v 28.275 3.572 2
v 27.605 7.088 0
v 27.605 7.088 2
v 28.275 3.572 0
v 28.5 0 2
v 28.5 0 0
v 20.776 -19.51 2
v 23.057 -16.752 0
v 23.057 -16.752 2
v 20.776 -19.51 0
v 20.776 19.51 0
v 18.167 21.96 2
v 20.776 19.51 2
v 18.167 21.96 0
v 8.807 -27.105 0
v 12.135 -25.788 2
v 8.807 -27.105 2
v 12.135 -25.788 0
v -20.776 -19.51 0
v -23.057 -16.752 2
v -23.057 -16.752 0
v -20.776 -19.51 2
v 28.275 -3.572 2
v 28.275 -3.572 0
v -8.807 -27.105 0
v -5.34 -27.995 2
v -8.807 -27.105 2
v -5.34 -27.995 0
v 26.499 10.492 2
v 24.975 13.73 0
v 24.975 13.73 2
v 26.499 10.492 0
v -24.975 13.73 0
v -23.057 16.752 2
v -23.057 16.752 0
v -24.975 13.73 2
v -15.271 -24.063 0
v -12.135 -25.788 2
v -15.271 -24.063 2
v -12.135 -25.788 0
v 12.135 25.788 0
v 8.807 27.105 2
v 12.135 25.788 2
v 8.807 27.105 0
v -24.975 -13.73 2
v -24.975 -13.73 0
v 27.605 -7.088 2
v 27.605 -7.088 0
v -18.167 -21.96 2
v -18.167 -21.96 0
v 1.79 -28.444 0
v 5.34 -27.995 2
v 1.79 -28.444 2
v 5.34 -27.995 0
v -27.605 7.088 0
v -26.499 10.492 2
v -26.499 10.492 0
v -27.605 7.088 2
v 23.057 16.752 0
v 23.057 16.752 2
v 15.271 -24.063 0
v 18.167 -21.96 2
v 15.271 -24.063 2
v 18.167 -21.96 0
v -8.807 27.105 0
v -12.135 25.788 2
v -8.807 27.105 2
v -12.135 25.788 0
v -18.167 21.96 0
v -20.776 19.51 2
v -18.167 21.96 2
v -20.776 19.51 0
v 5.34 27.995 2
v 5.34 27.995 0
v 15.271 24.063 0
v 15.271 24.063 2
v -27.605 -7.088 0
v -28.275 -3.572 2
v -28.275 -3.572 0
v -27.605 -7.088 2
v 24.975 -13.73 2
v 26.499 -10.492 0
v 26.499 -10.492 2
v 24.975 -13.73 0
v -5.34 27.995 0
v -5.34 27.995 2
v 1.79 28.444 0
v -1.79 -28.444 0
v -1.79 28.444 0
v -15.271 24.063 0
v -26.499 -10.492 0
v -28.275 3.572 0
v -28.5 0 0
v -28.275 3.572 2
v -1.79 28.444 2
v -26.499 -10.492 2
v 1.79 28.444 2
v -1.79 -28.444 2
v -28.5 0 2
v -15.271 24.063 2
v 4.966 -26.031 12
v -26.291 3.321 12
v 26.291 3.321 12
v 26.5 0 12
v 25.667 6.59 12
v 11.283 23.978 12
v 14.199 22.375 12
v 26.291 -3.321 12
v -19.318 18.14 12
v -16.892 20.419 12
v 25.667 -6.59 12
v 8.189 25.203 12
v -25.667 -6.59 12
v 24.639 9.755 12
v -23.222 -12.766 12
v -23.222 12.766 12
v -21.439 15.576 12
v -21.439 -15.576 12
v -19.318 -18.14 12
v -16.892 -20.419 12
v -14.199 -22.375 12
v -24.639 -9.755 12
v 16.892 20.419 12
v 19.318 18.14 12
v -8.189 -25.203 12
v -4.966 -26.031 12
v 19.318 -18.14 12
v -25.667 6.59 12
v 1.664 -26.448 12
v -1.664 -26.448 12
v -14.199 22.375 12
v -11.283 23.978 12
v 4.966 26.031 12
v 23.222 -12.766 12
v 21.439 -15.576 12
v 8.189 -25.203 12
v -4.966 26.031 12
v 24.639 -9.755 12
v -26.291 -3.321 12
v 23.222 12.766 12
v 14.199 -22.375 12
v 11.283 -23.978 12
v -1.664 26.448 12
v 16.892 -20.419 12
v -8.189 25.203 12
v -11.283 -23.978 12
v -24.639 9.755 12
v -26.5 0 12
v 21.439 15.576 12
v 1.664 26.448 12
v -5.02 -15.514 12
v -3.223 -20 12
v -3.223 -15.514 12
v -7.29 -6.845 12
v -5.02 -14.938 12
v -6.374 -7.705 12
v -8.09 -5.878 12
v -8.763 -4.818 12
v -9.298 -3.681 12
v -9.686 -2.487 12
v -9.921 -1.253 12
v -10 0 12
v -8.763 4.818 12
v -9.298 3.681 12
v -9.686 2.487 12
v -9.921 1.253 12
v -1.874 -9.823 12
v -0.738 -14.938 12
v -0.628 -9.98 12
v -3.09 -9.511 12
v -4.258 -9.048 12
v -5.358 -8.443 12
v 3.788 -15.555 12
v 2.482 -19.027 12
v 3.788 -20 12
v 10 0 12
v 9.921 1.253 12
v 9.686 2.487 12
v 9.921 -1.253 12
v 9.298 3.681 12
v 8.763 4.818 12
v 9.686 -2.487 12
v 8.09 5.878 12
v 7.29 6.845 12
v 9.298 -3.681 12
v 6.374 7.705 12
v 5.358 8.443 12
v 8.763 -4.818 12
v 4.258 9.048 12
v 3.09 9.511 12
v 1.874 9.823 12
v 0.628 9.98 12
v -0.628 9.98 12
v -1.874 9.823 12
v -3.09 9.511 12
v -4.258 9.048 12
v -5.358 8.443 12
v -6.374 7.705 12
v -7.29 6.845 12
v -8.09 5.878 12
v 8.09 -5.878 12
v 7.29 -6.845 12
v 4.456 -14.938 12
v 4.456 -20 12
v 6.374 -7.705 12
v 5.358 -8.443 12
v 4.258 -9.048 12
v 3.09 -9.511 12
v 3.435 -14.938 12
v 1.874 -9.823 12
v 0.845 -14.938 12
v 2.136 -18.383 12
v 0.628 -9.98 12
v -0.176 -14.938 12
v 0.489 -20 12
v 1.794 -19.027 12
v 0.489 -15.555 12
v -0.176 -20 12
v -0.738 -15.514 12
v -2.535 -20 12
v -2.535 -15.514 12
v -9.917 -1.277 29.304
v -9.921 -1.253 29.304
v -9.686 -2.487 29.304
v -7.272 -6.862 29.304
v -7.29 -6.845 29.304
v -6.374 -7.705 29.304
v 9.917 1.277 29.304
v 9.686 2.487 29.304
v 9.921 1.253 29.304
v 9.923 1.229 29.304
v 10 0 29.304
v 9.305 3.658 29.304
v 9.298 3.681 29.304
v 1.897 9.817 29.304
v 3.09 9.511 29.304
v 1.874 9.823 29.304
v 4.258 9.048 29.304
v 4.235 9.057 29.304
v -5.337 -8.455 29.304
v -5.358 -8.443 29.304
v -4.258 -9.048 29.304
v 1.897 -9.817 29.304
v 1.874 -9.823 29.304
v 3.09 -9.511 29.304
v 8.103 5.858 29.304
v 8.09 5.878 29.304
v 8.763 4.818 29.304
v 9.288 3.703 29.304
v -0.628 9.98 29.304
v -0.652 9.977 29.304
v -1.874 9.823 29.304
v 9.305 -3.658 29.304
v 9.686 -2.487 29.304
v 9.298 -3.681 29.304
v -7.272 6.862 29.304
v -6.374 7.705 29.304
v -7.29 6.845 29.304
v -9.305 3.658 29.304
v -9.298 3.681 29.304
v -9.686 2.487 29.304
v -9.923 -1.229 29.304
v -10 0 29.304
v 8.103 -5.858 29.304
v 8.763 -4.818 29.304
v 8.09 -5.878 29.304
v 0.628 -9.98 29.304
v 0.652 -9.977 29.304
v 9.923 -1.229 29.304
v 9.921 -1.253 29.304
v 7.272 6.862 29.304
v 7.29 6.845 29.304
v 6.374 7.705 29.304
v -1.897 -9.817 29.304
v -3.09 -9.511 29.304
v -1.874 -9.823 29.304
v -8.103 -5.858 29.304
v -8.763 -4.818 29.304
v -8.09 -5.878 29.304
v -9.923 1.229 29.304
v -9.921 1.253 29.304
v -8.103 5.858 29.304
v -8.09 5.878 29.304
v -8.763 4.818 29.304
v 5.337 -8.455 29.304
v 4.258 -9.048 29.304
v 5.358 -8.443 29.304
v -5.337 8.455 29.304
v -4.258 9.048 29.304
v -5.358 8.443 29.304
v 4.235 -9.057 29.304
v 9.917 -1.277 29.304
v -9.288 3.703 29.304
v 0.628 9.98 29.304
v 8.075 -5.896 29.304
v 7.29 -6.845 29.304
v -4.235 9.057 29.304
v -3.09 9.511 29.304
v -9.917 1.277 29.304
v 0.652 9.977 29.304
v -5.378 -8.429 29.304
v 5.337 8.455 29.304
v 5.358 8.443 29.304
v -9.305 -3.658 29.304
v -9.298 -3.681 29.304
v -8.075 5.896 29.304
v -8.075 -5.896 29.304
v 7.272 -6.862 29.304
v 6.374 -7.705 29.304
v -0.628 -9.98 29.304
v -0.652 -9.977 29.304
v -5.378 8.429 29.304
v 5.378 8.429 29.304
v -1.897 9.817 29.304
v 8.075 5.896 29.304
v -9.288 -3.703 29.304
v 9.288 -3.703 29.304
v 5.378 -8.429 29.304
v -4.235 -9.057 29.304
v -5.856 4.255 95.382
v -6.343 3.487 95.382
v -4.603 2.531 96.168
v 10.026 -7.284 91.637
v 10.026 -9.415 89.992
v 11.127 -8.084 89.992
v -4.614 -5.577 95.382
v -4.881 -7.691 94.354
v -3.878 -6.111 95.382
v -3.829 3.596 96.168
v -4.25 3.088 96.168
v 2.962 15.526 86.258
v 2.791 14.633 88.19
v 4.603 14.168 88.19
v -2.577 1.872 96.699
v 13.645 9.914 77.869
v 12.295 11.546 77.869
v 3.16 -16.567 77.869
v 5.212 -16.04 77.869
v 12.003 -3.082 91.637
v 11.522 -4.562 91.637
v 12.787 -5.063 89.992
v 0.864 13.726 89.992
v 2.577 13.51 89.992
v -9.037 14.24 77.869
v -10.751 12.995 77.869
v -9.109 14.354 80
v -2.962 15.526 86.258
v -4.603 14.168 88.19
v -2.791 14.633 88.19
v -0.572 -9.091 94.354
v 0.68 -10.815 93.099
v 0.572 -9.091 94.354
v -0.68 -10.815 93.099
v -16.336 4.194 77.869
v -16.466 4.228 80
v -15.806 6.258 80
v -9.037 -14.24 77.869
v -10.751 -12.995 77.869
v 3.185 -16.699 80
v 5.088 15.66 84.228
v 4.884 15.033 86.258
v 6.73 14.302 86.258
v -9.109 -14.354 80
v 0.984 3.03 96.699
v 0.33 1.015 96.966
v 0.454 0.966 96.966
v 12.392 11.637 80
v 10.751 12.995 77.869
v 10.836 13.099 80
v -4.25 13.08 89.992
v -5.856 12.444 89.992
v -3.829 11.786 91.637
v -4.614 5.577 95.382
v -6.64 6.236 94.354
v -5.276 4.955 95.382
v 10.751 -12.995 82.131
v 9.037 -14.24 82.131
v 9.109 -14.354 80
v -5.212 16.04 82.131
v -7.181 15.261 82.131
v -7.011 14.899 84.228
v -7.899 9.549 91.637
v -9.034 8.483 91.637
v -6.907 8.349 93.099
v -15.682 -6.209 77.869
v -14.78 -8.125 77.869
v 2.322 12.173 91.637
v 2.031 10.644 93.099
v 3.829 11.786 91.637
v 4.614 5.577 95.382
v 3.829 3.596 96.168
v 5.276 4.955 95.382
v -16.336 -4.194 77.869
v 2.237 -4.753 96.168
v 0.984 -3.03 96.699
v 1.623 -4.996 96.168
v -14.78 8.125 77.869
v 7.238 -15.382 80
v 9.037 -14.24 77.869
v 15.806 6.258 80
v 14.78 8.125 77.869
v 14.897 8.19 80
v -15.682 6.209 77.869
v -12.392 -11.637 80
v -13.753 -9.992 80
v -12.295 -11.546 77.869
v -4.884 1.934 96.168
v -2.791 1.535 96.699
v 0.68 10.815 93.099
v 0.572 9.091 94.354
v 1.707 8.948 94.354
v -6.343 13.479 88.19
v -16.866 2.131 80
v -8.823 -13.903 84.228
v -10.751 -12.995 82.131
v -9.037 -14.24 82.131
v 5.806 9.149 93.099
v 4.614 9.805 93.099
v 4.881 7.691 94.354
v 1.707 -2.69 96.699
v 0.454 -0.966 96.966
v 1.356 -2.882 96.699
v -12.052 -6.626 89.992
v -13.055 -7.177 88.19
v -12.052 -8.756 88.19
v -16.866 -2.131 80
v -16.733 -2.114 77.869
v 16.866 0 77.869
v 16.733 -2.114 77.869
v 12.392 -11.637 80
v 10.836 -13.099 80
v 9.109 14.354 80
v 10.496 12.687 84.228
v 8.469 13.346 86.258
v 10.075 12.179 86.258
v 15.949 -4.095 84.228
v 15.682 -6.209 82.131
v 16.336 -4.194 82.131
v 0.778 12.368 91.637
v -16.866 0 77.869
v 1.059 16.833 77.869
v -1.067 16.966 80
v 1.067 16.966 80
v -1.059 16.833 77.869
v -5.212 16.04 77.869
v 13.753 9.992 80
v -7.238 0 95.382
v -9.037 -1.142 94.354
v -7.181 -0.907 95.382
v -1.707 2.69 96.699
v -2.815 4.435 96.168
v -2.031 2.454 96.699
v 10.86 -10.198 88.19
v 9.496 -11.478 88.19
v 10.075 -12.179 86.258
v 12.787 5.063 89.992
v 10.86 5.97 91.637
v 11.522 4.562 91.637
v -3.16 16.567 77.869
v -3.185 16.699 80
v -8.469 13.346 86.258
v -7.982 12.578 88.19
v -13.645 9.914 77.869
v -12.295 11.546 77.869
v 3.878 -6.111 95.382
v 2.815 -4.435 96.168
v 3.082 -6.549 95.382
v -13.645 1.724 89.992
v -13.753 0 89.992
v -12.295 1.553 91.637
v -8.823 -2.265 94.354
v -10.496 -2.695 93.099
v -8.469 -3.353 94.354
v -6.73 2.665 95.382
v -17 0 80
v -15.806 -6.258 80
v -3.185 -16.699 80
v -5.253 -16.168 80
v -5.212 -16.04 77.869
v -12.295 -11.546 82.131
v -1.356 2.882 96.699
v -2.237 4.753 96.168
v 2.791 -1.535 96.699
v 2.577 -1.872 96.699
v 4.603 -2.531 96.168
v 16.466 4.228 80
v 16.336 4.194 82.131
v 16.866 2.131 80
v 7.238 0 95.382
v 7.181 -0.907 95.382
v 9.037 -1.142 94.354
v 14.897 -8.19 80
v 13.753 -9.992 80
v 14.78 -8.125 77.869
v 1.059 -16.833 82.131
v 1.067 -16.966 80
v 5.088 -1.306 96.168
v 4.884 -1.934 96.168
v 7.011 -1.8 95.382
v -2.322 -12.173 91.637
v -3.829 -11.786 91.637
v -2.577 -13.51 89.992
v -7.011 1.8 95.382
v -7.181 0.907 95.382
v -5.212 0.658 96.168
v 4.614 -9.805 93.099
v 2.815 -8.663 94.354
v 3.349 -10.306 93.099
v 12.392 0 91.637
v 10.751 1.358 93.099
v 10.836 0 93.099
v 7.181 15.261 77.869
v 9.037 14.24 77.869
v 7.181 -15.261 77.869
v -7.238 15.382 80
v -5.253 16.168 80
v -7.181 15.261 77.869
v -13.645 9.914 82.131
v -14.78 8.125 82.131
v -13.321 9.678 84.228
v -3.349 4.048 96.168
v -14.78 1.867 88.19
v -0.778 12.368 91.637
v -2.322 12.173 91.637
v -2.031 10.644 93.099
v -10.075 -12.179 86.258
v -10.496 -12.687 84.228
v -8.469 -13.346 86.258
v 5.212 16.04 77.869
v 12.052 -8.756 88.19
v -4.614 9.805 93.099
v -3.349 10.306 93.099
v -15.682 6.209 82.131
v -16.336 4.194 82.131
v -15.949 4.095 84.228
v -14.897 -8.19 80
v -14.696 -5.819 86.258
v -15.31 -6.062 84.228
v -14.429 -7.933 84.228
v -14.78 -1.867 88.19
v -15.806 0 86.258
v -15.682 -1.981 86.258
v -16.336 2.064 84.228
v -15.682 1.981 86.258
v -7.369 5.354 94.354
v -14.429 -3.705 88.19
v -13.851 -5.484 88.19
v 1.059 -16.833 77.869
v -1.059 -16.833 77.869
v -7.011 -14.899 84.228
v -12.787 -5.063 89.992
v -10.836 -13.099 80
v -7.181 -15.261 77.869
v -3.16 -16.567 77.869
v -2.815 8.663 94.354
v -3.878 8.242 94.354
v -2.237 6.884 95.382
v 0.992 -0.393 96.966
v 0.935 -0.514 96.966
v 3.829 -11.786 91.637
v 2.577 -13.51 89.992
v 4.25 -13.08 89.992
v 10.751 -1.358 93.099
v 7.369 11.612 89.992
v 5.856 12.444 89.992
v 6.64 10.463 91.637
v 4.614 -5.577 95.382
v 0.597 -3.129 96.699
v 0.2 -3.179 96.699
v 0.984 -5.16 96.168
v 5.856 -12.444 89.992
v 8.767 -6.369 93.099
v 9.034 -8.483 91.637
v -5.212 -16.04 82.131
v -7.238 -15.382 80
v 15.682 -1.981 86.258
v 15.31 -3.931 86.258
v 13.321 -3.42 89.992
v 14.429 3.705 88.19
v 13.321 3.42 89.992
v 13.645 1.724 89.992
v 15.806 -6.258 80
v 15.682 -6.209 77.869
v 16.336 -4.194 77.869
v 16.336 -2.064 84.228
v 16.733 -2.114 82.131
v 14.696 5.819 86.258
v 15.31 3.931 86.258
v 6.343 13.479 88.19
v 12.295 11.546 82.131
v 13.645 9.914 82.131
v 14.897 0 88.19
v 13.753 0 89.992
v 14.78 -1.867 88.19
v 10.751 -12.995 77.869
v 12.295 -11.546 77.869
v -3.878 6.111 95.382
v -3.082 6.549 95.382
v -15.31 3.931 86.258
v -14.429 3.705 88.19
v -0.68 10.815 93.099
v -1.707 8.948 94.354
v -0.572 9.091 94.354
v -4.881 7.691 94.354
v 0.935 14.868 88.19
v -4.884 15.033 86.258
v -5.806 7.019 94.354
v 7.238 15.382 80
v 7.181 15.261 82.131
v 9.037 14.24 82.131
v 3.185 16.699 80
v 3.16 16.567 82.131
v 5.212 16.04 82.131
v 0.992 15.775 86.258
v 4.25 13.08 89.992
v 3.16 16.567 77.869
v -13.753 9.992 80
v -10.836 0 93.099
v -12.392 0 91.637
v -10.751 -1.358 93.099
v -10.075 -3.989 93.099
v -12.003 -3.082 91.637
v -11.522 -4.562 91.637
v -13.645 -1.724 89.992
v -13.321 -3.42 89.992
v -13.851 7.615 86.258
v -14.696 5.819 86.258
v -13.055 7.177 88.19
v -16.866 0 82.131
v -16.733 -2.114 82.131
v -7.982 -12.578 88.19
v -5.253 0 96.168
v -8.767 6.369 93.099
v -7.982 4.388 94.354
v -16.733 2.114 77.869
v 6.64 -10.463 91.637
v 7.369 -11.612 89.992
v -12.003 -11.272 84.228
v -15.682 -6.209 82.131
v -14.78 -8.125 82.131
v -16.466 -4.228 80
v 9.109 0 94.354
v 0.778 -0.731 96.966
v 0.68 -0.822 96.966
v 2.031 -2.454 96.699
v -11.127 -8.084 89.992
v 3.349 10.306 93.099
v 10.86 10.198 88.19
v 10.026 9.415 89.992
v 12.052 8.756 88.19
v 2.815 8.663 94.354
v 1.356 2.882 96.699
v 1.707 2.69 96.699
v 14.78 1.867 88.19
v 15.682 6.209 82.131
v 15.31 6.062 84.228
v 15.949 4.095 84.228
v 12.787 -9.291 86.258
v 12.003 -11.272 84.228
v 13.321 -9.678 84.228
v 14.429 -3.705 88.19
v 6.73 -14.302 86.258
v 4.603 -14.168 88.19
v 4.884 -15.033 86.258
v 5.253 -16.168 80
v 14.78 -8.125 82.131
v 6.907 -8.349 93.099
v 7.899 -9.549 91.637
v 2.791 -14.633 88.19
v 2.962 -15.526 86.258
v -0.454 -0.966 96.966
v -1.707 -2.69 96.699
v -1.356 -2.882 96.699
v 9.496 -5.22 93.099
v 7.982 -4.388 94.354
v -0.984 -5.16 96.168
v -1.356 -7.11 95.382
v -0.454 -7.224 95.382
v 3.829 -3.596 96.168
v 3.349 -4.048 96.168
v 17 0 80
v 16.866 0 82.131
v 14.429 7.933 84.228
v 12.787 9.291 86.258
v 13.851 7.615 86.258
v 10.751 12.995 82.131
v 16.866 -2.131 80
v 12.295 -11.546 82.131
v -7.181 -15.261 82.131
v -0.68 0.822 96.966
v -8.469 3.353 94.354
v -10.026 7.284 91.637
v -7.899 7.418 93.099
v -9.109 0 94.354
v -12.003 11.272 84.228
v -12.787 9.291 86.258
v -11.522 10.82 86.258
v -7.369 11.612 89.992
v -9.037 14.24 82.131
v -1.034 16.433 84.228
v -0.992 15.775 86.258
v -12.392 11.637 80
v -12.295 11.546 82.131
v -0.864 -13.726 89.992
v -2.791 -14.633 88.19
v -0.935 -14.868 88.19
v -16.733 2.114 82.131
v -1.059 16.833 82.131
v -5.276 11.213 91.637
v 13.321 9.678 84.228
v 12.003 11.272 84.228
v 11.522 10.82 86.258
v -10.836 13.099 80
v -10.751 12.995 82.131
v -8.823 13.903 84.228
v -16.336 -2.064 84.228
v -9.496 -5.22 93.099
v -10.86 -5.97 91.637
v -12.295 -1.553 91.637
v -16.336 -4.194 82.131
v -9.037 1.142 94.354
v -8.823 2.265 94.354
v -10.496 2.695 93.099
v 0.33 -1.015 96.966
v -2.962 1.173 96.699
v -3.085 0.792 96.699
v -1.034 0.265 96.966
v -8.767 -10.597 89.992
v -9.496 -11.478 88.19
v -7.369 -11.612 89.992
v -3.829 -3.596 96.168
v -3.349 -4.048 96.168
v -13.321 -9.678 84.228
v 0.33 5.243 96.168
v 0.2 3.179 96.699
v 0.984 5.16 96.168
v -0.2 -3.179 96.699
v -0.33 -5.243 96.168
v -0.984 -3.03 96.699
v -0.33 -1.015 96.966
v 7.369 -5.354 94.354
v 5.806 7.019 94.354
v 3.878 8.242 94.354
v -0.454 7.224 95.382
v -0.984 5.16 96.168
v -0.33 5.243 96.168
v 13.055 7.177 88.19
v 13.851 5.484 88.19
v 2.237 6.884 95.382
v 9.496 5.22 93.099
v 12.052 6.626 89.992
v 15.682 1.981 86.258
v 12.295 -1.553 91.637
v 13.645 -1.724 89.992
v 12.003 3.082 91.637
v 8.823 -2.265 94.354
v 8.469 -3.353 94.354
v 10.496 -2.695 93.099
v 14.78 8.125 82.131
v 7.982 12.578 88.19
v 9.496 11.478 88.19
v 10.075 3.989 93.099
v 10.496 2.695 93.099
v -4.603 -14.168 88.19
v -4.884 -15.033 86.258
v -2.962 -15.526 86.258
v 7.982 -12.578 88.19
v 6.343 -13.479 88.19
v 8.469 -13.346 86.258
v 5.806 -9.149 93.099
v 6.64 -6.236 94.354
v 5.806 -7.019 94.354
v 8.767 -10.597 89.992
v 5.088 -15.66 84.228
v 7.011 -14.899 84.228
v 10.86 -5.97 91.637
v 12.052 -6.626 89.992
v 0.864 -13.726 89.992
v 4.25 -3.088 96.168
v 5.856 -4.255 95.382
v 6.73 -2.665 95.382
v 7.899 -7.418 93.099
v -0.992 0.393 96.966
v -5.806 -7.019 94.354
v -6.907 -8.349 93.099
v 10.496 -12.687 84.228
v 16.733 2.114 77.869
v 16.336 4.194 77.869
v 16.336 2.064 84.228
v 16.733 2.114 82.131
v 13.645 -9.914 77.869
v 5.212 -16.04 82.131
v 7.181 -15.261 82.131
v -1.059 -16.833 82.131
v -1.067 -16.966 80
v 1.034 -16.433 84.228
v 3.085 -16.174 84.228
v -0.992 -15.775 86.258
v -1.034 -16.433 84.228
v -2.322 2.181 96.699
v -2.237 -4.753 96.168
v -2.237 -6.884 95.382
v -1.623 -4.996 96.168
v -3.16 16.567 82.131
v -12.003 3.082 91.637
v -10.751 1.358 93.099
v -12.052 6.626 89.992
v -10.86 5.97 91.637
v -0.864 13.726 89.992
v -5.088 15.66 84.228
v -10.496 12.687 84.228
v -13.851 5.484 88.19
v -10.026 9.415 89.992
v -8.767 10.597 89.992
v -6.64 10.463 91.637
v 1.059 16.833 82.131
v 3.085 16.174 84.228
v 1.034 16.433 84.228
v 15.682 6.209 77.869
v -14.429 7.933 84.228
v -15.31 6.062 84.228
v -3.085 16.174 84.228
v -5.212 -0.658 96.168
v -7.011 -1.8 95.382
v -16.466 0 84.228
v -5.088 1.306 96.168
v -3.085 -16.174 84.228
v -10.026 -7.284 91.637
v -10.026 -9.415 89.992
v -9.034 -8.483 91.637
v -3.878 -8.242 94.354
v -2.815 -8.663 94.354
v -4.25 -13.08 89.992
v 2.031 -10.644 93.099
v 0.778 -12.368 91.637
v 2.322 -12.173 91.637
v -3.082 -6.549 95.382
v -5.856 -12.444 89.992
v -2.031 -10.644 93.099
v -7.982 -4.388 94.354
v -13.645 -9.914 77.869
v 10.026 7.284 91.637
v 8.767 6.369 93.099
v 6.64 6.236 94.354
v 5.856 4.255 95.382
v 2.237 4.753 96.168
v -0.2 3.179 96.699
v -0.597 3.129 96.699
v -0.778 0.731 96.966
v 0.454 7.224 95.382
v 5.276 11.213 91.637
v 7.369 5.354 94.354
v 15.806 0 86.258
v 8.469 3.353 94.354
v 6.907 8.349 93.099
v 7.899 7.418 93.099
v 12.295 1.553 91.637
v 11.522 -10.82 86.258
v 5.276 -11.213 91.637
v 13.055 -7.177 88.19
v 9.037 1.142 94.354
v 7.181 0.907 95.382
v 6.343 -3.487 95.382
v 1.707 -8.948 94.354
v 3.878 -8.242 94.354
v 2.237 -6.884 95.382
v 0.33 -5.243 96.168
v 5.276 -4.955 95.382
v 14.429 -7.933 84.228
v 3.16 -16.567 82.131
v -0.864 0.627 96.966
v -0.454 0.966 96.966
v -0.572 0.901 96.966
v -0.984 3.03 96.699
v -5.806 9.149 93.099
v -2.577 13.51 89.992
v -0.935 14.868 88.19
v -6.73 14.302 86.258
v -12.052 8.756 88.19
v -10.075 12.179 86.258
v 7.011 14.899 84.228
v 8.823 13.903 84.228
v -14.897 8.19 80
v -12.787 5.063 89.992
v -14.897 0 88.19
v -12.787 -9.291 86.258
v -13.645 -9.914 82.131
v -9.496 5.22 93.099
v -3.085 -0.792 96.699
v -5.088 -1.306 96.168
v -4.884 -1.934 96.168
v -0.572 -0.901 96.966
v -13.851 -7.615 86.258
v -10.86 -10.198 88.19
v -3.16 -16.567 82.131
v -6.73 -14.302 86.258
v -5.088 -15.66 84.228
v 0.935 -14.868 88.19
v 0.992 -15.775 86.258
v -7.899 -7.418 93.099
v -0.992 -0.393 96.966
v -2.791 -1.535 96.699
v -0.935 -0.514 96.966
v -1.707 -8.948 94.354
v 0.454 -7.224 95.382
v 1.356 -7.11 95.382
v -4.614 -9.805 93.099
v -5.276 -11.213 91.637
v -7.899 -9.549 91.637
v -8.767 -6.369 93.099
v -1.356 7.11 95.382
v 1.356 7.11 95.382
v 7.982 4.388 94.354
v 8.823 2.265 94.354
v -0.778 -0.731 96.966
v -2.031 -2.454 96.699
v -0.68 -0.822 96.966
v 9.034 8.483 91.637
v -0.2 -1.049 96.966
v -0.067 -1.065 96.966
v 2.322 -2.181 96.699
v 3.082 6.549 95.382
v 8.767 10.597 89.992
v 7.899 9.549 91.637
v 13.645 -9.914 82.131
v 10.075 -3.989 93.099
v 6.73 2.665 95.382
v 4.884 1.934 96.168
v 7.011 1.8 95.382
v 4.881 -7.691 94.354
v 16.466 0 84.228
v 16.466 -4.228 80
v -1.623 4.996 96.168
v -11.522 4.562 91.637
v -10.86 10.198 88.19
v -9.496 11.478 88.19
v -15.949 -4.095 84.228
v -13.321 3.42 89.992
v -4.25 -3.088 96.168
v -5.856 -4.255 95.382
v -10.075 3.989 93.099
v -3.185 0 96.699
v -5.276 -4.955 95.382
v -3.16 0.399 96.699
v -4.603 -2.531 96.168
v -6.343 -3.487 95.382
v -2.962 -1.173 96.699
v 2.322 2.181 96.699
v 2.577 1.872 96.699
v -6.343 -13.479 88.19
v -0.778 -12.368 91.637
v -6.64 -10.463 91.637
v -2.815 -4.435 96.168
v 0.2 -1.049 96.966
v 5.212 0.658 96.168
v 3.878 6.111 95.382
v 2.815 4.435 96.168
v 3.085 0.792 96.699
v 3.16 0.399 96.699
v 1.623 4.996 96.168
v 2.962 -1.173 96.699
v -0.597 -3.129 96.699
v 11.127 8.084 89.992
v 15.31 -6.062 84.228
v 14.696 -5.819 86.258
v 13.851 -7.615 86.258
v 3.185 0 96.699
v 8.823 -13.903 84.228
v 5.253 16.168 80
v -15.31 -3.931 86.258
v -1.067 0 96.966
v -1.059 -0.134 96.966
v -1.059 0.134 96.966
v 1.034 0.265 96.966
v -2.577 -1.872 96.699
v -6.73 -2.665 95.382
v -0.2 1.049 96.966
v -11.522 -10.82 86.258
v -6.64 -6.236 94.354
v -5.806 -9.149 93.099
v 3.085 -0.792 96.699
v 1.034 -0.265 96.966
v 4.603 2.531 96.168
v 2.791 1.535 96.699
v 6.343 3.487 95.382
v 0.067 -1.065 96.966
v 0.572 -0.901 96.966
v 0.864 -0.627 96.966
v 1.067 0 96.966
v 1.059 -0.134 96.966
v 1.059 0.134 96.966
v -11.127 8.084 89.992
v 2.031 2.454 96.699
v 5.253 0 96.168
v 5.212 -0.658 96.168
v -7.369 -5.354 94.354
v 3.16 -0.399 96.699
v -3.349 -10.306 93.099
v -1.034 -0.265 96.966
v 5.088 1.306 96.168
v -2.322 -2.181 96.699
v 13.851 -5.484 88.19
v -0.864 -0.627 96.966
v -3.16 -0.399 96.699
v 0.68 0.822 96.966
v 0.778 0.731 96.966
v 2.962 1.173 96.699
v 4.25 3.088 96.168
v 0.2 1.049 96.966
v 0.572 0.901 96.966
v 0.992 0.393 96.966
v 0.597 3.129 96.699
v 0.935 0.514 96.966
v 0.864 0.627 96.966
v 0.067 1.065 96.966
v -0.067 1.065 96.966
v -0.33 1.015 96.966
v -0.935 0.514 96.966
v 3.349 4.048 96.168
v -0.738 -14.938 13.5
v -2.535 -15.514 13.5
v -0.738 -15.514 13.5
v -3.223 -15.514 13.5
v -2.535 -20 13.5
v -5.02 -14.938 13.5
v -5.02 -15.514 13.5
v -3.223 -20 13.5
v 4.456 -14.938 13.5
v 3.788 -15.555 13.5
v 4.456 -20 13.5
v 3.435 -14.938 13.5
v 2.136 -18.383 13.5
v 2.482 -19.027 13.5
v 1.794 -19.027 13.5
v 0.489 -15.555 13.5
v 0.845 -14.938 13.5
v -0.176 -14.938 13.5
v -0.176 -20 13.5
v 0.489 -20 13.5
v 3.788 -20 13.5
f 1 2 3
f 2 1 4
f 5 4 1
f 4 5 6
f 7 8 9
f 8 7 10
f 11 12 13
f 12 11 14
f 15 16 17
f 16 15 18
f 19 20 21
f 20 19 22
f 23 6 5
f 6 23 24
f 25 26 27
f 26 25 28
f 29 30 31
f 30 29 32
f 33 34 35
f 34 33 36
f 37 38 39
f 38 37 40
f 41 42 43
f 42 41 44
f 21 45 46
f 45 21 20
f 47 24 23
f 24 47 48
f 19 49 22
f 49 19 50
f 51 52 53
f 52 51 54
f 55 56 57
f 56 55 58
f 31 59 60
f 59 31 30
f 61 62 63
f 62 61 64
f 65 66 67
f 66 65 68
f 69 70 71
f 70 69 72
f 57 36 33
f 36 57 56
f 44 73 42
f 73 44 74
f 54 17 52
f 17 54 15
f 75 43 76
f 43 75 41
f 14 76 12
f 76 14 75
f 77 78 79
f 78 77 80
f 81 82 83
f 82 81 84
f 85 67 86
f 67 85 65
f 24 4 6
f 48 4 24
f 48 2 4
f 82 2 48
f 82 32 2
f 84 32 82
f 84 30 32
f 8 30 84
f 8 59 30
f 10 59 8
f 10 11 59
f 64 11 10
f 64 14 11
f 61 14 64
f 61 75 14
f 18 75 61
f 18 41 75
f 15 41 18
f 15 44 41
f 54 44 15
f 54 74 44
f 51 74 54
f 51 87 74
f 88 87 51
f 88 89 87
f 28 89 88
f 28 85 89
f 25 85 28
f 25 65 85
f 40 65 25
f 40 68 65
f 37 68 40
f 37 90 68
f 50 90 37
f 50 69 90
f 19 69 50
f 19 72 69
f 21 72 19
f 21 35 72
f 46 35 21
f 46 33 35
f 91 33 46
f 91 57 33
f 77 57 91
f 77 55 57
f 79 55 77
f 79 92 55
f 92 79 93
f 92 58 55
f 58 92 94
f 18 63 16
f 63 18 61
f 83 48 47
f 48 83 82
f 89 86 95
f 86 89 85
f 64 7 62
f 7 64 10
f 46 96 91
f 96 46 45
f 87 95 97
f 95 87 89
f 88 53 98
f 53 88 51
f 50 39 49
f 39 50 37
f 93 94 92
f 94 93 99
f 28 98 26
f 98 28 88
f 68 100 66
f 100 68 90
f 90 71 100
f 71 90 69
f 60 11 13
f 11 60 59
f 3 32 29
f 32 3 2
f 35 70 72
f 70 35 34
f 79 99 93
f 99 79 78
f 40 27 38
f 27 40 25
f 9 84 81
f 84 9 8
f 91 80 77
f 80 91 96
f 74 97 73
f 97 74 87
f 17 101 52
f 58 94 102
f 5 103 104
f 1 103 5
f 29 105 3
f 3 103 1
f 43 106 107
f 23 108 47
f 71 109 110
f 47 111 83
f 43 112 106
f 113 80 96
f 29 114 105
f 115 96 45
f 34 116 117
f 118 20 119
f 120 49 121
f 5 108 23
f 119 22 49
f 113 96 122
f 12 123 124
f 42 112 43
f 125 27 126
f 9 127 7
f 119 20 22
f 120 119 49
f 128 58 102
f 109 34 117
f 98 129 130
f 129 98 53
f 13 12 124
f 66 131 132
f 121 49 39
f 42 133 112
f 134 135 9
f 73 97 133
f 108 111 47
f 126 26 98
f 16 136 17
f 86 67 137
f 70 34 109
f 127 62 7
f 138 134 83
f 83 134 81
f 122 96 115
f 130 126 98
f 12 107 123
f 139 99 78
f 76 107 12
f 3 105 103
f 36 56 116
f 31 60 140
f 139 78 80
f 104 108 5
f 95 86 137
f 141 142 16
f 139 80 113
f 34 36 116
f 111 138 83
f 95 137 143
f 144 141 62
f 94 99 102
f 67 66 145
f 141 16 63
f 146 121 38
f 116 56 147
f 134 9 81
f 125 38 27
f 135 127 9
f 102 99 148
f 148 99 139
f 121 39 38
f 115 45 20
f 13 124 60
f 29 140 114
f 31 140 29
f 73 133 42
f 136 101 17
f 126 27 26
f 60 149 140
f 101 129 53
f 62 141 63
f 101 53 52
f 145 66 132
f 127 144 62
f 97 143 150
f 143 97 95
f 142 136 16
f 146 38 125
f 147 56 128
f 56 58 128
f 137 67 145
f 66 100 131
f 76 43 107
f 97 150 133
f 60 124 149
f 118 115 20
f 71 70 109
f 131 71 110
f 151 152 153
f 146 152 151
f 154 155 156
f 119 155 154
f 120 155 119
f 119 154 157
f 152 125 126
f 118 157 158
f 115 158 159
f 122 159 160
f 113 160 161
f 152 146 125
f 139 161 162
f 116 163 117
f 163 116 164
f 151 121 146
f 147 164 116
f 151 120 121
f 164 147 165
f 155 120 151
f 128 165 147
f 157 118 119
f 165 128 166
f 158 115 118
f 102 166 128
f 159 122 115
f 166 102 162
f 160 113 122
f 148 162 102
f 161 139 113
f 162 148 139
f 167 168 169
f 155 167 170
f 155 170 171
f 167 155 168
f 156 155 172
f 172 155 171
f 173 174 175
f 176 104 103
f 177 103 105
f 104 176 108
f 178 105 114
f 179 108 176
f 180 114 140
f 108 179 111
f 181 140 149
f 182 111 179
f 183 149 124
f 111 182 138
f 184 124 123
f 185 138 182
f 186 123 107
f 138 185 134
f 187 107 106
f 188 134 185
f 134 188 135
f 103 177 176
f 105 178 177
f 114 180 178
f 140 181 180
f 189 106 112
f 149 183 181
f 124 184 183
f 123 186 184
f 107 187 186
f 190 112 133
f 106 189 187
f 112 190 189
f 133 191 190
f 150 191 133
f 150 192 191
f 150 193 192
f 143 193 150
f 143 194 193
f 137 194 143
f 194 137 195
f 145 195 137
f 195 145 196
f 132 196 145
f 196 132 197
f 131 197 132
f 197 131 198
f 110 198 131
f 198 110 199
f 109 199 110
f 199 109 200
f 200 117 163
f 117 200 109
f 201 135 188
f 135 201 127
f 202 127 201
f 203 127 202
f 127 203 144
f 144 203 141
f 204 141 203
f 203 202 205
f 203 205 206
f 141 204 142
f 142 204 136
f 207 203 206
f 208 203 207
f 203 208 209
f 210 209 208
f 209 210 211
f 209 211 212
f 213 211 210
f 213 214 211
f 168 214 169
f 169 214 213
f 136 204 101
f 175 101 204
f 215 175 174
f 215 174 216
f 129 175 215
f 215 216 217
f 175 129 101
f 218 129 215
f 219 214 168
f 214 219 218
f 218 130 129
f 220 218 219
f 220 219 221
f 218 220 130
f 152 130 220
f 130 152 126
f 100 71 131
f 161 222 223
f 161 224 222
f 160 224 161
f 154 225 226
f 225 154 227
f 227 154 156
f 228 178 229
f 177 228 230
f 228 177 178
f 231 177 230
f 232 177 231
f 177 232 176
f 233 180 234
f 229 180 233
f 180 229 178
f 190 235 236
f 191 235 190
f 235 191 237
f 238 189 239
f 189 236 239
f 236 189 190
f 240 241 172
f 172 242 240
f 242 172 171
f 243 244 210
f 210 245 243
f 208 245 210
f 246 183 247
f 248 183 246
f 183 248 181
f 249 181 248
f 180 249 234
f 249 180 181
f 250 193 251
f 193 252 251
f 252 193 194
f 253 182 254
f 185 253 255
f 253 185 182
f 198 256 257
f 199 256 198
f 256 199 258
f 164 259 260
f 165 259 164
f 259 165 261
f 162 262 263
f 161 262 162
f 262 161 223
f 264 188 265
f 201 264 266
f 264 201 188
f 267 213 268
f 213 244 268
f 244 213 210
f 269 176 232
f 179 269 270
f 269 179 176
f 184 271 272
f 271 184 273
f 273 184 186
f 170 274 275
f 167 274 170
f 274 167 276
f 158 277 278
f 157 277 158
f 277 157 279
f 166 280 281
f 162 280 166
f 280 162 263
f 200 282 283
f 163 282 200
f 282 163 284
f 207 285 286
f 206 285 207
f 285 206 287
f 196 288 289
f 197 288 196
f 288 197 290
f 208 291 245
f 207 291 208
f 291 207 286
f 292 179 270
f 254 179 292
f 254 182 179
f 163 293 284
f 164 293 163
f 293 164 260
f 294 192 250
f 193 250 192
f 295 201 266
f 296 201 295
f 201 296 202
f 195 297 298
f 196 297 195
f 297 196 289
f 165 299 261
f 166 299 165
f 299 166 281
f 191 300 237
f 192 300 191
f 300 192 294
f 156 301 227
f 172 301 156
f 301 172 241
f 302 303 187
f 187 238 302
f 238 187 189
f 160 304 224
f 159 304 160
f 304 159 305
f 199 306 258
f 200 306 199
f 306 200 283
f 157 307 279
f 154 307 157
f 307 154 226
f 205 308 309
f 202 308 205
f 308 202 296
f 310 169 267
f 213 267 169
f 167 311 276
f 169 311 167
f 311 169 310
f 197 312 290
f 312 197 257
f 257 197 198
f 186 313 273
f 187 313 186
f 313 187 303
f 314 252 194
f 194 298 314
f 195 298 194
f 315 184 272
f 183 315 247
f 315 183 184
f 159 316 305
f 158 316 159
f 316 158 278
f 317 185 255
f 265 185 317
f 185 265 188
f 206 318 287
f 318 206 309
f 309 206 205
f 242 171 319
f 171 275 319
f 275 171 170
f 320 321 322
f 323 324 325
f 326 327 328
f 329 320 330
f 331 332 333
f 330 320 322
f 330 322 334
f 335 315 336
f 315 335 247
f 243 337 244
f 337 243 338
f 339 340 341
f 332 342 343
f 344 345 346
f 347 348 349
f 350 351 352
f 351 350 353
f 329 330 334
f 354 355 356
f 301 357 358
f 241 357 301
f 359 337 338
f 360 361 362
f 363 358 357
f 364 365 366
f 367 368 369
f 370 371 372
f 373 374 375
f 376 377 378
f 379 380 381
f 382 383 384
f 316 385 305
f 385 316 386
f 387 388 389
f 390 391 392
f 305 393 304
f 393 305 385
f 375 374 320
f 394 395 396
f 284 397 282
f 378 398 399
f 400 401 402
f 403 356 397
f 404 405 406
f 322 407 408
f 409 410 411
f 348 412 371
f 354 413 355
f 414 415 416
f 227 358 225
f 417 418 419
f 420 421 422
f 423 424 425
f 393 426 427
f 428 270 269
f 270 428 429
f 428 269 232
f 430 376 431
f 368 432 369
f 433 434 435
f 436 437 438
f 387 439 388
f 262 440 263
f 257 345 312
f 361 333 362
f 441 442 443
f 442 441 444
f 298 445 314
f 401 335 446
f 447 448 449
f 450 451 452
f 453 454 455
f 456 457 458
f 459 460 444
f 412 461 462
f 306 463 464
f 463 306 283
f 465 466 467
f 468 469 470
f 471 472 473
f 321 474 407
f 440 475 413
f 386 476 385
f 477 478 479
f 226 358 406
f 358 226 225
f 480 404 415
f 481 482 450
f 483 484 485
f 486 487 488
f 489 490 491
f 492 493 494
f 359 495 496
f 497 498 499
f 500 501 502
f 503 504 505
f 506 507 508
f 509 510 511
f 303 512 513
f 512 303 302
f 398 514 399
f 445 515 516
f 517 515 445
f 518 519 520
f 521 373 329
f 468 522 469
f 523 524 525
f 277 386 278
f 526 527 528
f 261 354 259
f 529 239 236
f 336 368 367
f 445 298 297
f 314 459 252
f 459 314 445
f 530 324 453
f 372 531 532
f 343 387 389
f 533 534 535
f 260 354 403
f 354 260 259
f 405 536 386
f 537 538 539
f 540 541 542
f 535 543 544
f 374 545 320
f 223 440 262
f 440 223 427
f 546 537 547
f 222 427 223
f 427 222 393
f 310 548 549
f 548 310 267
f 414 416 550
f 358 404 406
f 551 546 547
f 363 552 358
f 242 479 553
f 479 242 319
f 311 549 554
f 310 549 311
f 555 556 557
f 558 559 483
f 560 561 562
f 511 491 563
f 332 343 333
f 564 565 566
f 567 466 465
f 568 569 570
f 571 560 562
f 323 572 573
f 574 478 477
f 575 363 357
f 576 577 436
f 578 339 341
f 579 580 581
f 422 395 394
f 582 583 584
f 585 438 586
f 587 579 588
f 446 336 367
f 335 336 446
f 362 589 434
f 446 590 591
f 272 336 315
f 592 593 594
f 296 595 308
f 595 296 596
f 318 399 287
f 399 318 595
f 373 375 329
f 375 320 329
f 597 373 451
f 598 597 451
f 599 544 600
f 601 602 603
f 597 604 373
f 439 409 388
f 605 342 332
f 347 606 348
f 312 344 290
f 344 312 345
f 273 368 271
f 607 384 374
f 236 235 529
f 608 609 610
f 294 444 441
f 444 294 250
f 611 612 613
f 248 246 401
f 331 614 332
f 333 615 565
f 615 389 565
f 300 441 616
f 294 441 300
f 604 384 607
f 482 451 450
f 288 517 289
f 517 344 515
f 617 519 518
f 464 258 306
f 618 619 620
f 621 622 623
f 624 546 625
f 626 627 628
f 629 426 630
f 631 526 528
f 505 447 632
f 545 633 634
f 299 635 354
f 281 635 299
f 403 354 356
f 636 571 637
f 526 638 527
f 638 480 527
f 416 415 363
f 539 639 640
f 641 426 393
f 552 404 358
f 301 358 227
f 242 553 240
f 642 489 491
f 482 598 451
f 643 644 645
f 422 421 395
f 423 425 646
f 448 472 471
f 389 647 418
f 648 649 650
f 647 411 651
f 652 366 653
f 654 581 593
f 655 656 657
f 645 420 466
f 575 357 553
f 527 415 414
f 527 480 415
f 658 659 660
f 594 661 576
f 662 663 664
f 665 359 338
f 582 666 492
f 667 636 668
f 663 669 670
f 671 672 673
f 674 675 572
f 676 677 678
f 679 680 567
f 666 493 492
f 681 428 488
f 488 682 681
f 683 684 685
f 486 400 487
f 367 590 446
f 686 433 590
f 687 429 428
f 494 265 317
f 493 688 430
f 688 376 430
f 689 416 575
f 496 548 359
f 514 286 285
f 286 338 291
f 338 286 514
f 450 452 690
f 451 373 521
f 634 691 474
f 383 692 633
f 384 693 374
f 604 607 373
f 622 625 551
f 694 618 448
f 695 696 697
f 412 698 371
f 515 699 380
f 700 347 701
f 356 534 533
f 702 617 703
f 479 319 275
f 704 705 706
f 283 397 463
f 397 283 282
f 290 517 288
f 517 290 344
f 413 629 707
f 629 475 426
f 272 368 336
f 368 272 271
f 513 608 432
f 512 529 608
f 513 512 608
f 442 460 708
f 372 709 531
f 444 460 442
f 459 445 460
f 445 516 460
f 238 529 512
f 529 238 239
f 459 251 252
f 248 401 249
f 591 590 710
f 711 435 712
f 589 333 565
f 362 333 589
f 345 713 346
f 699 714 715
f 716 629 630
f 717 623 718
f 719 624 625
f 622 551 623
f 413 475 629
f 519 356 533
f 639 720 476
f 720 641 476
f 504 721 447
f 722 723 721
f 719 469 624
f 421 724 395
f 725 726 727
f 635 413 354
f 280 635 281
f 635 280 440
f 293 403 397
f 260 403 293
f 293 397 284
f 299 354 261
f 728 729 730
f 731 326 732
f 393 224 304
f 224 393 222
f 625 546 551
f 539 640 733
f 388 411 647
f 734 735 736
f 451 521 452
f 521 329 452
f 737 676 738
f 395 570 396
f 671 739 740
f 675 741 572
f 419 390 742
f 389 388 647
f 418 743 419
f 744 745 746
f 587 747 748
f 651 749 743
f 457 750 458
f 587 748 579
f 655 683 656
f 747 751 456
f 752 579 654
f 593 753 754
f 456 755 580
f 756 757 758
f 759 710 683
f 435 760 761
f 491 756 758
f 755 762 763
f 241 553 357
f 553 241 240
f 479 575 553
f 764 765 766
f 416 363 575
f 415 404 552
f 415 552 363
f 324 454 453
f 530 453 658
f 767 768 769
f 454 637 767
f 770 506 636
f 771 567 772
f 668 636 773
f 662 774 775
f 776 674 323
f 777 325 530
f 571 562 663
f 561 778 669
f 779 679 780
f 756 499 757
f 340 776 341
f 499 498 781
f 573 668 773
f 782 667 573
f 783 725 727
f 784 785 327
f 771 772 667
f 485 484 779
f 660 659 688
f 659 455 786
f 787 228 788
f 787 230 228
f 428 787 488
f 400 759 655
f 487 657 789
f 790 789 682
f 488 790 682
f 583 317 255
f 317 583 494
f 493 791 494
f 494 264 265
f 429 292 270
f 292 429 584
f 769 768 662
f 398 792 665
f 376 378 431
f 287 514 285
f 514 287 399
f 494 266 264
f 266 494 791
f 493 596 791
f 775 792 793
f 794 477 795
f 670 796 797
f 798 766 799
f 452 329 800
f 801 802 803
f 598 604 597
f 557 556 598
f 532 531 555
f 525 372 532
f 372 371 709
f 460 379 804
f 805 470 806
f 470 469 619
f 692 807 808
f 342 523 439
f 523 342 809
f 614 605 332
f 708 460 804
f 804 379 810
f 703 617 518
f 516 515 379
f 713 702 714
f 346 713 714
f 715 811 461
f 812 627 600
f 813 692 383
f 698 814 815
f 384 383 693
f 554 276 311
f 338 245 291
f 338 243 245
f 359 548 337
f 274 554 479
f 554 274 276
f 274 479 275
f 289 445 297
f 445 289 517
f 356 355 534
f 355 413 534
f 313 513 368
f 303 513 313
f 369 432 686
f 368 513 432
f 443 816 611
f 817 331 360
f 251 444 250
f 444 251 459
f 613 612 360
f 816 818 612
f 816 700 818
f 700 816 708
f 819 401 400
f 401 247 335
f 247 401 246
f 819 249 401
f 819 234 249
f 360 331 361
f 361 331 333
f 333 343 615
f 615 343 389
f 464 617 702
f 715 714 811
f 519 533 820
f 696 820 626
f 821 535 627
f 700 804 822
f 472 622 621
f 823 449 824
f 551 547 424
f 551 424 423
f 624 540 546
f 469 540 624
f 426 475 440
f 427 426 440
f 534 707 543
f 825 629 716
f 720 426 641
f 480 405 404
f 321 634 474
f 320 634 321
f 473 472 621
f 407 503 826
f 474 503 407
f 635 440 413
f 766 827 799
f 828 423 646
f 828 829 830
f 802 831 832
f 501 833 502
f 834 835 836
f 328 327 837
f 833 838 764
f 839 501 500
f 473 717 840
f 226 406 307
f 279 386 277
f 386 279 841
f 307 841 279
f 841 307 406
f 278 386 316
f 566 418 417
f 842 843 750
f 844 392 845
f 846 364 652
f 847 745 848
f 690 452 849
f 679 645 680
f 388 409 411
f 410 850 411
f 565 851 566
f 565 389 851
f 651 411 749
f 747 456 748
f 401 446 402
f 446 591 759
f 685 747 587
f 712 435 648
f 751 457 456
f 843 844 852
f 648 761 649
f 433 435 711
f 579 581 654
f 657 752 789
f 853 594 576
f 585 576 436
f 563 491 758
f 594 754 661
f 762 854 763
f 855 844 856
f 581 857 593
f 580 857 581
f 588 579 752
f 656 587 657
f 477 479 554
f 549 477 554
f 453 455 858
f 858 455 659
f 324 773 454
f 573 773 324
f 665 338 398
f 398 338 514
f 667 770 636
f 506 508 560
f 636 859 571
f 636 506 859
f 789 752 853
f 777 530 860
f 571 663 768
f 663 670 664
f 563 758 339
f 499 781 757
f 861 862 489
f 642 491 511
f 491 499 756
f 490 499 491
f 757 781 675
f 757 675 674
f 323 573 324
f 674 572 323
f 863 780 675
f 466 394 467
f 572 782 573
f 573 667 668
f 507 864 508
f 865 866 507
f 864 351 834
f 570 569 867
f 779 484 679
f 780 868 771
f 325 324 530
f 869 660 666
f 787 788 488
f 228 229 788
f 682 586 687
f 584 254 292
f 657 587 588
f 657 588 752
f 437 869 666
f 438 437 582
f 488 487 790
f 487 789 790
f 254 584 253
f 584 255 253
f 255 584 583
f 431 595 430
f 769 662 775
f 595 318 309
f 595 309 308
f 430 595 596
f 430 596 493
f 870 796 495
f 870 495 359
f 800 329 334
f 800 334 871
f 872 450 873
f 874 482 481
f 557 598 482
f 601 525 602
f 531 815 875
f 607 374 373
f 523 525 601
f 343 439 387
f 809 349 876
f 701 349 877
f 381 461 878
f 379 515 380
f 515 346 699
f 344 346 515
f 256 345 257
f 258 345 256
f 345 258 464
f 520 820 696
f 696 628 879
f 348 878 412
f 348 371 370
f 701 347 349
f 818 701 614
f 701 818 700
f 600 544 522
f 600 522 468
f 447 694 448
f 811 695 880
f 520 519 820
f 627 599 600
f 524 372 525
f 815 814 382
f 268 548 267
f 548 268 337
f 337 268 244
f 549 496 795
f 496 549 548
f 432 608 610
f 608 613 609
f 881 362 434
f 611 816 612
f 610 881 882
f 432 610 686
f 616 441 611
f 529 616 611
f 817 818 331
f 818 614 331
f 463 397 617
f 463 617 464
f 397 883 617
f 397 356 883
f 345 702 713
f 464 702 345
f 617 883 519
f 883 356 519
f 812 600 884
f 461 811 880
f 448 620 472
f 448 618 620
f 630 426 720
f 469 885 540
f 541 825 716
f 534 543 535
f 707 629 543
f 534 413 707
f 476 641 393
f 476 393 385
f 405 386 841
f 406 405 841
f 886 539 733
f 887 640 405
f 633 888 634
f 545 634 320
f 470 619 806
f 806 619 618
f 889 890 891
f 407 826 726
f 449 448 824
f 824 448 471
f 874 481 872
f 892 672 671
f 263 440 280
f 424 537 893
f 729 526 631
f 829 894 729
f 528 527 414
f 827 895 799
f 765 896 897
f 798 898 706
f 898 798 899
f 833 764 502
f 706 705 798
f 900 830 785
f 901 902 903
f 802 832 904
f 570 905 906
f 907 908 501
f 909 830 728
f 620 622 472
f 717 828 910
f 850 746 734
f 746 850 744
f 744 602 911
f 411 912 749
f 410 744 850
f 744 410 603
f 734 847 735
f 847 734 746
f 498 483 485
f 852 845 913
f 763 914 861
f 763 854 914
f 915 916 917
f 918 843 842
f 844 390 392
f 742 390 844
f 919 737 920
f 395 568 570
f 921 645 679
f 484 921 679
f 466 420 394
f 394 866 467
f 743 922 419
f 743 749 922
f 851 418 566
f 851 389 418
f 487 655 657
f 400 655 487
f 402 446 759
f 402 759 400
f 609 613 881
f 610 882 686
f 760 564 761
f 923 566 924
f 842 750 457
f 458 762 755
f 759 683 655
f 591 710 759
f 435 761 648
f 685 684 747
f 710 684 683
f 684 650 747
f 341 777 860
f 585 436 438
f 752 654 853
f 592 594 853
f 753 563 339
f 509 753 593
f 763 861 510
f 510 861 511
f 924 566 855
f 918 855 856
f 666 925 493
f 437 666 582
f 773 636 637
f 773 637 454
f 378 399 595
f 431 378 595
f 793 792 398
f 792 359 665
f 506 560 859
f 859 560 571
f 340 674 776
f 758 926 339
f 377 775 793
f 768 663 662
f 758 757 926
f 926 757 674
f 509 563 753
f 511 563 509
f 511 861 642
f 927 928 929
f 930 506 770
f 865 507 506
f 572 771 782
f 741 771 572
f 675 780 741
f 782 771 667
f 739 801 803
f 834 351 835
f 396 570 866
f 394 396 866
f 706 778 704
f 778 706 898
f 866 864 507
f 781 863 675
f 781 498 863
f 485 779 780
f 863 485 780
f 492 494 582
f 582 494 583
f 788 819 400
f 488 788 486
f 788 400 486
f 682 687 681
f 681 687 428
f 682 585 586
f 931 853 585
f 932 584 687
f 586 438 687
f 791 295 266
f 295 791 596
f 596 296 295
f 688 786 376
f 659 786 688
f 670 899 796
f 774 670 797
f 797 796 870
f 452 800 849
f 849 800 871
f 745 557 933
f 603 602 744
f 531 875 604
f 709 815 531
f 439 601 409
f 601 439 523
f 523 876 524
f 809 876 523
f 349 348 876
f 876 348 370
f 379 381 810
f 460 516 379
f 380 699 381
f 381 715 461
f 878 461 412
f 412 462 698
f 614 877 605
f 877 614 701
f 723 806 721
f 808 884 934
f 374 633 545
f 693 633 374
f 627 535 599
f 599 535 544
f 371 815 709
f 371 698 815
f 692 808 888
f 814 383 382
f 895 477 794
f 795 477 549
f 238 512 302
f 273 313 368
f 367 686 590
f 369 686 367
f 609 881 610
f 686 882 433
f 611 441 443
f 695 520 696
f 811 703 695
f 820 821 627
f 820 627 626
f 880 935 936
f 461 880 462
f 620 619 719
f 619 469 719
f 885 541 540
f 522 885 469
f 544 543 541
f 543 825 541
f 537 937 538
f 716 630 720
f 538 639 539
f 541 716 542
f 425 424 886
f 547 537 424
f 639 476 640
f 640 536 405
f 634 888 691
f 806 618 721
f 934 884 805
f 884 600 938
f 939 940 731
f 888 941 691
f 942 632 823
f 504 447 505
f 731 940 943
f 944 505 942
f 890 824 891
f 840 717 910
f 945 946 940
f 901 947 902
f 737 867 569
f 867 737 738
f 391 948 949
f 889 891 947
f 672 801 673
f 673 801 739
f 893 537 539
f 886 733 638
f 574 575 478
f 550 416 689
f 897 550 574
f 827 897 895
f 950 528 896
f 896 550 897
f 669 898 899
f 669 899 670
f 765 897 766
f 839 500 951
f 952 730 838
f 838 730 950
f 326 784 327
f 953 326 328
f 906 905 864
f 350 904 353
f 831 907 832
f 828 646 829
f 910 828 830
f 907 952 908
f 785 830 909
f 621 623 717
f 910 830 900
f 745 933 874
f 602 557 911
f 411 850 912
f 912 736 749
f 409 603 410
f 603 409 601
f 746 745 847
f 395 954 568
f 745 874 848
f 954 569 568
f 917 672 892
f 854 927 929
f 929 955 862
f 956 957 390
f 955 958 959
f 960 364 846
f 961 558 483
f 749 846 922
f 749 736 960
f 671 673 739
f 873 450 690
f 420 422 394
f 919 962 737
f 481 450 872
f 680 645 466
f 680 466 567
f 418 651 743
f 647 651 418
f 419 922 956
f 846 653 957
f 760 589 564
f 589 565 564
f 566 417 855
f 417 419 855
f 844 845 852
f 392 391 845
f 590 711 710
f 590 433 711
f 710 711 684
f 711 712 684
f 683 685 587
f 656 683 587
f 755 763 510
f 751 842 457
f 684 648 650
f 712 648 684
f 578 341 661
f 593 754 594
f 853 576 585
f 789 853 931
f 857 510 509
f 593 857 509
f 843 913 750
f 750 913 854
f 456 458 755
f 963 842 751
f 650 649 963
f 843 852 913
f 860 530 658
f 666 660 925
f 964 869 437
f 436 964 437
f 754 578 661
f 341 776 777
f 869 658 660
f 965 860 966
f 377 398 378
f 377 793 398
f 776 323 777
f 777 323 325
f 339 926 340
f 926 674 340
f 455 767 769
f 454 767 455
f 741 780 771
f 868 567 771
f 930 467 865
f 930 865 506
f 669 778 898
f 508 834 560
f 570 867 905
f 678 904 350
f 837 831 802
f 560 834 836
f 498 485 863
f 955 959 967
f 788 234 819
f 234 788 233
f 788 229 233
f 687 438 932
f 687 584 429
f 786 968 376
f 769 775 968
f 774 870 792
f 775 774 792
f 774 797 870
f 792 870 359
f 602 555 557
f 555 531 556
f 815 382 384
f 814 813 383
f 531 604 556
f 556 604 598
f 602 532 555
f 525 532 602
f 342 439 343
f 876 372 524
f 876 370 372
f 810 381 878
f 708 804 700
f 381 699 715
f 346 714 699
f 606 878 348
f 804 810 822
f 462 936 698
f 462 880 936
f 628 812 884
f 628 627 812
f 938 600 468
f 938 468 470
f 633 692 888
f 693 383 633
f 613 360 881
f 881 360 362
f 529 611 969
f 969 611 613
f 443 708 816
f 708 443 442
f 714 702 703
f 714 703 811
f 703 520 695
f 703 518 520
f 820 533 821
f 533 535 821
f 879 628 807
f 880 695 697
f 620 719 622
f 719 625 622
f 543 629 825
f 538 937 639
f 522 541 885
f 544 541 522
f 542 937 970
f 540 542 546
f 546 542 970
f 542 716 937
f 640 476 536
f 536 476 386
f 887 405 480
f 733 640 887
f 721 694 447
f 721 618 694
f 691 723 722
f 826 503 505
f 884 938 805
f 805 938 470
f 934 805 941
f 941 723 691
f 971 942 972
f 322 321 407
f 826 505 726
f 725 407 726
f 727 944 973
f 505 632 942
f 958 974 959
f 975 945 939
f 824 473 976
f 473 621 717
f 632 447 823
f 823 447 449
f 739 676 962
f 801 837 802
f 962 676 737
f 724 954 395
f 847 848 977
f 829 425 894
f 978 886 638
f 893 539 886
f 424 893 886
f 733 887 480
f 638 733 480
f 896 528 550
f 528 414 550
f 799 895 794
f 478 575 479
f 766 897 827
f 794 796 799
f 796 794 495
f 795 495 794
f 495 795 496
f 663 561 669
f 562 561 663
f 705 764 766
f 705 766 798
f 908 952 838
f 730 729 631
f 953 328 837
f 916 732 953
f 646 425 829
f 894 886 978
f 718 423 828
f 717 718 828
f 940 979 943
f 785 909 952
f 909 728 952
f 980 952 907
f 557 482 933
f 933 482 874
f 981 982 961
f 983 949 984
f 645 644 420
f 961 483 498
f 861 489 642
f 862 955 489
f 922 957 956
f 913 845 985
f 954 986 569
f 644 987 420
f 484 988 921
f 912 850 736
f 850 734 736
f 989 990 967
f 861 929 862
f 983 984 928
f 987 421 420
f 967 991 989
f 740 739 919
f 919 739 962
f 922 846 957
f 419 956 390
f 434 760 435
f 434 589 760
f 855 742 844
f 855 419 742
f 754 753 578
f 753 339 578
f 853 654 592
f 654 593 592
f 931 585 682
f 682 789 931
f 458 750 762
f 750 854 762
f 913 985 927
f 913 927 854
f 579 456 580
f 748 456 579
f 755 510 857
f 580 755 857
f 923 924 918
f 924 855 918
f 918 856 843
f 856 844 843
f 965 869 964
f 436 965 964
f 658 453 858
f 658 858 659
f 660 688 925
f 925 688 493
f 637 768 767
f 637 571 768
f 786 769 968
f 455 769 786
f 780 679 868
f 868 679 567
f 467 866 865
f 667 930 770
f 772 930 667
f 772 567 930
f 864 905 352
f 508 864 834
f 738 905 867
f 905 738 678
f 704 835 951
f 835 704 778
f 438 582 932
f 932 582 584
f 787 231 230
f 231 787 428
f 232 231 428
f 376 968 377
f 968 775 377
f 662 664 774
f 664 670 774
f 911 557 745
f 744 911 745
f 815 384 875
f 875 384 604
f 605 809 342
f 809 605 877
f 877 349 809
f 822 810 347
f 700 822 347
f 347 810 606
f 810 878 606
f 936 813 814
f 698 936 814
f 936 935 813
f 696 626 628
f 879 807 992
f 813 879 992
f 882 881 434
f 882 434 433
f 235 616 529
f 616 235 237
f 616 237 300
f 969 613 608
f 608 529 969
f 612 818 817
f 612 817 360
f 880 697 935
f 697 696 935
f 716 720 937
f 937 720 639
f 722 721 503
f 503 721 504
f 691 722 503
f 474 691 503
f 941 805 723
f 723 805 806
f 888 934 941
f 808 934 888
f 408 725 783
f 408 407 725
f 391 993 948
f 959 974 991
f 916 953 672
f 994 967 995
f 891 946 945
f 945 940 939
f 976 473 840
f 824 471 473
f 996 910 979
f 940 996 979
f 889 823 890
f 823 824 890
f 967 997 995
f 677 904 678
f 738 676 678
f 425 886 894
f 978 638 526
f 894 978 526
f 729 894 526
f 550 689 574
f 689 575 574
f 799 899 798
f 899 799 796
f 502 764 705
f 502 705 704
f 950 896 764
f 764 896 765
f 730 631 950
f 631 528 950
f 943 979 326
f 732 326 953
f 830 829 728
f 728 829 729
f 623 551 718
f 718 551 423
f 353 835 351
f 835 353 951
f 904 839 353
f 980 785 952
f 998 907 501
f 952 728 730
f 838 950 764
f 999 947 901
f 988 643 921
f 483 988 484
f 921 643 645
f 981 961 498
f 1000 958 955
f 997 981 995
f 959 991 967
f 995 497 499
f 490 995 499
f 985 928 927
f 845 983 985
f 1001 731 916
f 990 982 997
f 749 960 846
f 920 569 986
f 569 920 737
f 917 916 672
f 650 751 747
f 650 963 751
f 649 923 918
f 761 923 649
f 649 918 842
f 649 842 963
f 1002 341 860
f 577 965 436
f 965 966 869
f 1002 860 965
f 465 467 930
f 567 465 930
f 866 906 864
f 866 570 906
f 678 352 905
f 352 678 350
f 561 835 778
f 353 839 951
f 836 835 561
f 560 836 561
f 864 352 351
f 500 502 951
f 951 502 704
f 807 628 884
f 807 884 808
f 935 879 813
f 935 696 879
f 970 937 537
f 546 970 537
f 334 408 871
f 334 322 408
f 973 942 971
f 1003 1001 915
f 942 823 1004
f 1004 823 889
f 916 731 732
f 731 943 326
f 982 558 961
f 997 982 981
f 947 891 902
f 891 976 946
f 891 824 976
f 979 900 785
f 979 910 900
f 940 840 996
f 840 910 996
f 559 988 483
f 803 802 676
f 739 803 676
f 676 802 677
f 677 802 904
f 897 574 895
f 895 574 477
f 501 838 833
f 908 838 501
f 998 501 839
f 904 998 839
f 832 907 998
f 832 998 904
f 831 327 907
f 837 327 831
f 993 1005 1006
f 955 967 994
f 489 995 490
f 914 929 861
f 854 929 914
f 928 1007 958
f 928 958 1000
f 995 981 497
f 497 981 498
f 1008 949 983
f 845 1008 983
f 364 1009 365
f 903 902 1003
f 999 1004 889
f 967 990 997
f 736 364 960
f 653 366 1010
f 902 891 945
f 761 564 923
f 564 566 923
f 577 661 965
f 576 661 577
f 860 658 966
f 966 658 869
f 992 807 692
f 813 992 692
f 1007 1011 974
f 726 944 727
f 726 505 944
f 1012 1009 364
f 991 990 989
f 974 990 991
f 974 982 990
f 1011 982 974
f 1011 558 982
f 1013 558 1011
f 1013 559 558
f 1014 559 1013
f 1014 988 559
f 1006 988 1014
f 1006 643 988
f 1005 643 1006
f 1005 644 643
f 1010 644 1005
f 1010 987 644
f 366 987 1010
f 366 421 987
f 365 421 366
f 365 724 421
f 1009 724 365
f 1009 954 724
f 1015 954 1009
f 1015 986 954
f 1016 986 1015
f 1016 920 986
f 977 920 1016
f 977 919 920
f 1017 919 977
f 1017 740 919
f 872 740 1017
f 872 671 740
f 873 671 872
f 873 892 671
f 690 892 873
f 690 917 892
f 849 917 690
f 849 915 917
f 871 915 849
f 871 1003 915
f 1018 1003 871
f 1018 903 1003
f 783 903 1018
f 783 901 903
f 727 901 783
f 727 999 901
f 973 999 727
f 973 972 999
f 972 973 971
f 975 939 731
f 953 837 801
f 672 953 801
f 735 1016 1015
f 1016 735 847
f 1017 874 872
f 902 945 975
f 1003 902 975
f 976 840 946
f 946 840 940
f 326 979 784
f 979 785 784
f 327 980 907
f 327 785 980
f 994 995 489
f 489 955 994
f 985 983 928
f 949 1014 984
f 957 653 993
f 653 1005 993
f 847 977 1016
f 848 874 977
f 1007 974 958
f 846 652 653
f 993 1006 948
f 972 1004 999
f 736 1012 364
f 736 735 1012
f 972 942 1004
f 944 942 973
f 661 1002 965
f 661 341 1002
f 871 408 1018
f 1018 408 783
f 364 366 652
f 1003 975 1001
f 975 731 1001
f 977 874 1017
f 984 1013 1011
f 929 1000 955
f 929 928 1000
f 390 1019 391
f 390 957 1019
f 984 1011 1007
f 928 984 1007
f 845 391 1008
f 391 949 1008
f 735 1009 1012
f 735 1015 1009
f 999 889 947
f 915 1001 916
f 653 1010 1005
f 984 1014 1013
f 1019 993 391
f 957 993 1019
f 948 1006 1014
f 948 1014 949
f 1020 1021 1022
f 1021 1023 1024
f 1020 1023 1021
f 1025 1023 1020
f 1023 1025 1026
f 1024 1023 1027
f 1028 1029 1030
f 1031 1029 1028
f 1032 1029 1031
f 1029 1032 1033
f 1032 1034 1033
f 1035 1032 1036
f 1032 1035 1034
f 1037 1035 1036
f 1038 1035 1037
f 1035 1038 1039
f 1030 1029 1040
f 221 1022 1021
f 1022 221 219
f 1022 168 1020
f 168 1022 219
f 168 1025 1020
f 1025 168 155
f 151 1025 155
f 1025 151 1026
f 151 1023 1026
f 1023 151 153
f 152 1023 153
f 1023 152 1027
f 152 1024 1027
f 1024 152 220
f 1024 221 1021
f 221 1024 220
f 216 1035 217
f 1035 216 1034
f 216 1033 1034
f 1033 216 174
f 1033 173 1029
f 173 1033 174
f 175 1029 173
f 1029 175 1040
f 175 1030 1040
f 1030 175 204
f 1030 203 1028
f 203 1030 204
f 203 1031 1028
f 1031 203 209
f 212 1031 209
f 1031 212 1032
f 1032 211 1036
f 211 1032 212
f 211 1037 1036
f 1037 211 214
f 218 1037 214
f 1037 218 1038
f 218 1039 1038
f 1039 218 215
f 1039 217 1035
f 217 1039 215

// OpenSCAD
// configuration values
rb  = 57/2;
h1  = 10;
h2  = 80;
fs  = 5;


content = "TM";
font = "Droid Sans Mono Bold";

union () {
  cylinder(r1=rb, r2=rb, h=2, $fn=50);
  translate([0, 0, 2]) {
    cylinder(r1=rb, r2=rb-2, h=h1, $fn=50);
  }
  cylinder(r1=10, r2=10, h=h2, $fn=50);
  hull () {
    translate ([0, 0, h2]) {
      sphere(r=17, $fn=50);
    }
    translate ([0, 0, h1*3]) {
      sphere(r=10, $fn=50);
    }
  }
  translate ([-fs, -20, h1+2]) {
    linear_extrude(height=1.5) {
      text(content, font=font, size=fs);
    }
  }
}
